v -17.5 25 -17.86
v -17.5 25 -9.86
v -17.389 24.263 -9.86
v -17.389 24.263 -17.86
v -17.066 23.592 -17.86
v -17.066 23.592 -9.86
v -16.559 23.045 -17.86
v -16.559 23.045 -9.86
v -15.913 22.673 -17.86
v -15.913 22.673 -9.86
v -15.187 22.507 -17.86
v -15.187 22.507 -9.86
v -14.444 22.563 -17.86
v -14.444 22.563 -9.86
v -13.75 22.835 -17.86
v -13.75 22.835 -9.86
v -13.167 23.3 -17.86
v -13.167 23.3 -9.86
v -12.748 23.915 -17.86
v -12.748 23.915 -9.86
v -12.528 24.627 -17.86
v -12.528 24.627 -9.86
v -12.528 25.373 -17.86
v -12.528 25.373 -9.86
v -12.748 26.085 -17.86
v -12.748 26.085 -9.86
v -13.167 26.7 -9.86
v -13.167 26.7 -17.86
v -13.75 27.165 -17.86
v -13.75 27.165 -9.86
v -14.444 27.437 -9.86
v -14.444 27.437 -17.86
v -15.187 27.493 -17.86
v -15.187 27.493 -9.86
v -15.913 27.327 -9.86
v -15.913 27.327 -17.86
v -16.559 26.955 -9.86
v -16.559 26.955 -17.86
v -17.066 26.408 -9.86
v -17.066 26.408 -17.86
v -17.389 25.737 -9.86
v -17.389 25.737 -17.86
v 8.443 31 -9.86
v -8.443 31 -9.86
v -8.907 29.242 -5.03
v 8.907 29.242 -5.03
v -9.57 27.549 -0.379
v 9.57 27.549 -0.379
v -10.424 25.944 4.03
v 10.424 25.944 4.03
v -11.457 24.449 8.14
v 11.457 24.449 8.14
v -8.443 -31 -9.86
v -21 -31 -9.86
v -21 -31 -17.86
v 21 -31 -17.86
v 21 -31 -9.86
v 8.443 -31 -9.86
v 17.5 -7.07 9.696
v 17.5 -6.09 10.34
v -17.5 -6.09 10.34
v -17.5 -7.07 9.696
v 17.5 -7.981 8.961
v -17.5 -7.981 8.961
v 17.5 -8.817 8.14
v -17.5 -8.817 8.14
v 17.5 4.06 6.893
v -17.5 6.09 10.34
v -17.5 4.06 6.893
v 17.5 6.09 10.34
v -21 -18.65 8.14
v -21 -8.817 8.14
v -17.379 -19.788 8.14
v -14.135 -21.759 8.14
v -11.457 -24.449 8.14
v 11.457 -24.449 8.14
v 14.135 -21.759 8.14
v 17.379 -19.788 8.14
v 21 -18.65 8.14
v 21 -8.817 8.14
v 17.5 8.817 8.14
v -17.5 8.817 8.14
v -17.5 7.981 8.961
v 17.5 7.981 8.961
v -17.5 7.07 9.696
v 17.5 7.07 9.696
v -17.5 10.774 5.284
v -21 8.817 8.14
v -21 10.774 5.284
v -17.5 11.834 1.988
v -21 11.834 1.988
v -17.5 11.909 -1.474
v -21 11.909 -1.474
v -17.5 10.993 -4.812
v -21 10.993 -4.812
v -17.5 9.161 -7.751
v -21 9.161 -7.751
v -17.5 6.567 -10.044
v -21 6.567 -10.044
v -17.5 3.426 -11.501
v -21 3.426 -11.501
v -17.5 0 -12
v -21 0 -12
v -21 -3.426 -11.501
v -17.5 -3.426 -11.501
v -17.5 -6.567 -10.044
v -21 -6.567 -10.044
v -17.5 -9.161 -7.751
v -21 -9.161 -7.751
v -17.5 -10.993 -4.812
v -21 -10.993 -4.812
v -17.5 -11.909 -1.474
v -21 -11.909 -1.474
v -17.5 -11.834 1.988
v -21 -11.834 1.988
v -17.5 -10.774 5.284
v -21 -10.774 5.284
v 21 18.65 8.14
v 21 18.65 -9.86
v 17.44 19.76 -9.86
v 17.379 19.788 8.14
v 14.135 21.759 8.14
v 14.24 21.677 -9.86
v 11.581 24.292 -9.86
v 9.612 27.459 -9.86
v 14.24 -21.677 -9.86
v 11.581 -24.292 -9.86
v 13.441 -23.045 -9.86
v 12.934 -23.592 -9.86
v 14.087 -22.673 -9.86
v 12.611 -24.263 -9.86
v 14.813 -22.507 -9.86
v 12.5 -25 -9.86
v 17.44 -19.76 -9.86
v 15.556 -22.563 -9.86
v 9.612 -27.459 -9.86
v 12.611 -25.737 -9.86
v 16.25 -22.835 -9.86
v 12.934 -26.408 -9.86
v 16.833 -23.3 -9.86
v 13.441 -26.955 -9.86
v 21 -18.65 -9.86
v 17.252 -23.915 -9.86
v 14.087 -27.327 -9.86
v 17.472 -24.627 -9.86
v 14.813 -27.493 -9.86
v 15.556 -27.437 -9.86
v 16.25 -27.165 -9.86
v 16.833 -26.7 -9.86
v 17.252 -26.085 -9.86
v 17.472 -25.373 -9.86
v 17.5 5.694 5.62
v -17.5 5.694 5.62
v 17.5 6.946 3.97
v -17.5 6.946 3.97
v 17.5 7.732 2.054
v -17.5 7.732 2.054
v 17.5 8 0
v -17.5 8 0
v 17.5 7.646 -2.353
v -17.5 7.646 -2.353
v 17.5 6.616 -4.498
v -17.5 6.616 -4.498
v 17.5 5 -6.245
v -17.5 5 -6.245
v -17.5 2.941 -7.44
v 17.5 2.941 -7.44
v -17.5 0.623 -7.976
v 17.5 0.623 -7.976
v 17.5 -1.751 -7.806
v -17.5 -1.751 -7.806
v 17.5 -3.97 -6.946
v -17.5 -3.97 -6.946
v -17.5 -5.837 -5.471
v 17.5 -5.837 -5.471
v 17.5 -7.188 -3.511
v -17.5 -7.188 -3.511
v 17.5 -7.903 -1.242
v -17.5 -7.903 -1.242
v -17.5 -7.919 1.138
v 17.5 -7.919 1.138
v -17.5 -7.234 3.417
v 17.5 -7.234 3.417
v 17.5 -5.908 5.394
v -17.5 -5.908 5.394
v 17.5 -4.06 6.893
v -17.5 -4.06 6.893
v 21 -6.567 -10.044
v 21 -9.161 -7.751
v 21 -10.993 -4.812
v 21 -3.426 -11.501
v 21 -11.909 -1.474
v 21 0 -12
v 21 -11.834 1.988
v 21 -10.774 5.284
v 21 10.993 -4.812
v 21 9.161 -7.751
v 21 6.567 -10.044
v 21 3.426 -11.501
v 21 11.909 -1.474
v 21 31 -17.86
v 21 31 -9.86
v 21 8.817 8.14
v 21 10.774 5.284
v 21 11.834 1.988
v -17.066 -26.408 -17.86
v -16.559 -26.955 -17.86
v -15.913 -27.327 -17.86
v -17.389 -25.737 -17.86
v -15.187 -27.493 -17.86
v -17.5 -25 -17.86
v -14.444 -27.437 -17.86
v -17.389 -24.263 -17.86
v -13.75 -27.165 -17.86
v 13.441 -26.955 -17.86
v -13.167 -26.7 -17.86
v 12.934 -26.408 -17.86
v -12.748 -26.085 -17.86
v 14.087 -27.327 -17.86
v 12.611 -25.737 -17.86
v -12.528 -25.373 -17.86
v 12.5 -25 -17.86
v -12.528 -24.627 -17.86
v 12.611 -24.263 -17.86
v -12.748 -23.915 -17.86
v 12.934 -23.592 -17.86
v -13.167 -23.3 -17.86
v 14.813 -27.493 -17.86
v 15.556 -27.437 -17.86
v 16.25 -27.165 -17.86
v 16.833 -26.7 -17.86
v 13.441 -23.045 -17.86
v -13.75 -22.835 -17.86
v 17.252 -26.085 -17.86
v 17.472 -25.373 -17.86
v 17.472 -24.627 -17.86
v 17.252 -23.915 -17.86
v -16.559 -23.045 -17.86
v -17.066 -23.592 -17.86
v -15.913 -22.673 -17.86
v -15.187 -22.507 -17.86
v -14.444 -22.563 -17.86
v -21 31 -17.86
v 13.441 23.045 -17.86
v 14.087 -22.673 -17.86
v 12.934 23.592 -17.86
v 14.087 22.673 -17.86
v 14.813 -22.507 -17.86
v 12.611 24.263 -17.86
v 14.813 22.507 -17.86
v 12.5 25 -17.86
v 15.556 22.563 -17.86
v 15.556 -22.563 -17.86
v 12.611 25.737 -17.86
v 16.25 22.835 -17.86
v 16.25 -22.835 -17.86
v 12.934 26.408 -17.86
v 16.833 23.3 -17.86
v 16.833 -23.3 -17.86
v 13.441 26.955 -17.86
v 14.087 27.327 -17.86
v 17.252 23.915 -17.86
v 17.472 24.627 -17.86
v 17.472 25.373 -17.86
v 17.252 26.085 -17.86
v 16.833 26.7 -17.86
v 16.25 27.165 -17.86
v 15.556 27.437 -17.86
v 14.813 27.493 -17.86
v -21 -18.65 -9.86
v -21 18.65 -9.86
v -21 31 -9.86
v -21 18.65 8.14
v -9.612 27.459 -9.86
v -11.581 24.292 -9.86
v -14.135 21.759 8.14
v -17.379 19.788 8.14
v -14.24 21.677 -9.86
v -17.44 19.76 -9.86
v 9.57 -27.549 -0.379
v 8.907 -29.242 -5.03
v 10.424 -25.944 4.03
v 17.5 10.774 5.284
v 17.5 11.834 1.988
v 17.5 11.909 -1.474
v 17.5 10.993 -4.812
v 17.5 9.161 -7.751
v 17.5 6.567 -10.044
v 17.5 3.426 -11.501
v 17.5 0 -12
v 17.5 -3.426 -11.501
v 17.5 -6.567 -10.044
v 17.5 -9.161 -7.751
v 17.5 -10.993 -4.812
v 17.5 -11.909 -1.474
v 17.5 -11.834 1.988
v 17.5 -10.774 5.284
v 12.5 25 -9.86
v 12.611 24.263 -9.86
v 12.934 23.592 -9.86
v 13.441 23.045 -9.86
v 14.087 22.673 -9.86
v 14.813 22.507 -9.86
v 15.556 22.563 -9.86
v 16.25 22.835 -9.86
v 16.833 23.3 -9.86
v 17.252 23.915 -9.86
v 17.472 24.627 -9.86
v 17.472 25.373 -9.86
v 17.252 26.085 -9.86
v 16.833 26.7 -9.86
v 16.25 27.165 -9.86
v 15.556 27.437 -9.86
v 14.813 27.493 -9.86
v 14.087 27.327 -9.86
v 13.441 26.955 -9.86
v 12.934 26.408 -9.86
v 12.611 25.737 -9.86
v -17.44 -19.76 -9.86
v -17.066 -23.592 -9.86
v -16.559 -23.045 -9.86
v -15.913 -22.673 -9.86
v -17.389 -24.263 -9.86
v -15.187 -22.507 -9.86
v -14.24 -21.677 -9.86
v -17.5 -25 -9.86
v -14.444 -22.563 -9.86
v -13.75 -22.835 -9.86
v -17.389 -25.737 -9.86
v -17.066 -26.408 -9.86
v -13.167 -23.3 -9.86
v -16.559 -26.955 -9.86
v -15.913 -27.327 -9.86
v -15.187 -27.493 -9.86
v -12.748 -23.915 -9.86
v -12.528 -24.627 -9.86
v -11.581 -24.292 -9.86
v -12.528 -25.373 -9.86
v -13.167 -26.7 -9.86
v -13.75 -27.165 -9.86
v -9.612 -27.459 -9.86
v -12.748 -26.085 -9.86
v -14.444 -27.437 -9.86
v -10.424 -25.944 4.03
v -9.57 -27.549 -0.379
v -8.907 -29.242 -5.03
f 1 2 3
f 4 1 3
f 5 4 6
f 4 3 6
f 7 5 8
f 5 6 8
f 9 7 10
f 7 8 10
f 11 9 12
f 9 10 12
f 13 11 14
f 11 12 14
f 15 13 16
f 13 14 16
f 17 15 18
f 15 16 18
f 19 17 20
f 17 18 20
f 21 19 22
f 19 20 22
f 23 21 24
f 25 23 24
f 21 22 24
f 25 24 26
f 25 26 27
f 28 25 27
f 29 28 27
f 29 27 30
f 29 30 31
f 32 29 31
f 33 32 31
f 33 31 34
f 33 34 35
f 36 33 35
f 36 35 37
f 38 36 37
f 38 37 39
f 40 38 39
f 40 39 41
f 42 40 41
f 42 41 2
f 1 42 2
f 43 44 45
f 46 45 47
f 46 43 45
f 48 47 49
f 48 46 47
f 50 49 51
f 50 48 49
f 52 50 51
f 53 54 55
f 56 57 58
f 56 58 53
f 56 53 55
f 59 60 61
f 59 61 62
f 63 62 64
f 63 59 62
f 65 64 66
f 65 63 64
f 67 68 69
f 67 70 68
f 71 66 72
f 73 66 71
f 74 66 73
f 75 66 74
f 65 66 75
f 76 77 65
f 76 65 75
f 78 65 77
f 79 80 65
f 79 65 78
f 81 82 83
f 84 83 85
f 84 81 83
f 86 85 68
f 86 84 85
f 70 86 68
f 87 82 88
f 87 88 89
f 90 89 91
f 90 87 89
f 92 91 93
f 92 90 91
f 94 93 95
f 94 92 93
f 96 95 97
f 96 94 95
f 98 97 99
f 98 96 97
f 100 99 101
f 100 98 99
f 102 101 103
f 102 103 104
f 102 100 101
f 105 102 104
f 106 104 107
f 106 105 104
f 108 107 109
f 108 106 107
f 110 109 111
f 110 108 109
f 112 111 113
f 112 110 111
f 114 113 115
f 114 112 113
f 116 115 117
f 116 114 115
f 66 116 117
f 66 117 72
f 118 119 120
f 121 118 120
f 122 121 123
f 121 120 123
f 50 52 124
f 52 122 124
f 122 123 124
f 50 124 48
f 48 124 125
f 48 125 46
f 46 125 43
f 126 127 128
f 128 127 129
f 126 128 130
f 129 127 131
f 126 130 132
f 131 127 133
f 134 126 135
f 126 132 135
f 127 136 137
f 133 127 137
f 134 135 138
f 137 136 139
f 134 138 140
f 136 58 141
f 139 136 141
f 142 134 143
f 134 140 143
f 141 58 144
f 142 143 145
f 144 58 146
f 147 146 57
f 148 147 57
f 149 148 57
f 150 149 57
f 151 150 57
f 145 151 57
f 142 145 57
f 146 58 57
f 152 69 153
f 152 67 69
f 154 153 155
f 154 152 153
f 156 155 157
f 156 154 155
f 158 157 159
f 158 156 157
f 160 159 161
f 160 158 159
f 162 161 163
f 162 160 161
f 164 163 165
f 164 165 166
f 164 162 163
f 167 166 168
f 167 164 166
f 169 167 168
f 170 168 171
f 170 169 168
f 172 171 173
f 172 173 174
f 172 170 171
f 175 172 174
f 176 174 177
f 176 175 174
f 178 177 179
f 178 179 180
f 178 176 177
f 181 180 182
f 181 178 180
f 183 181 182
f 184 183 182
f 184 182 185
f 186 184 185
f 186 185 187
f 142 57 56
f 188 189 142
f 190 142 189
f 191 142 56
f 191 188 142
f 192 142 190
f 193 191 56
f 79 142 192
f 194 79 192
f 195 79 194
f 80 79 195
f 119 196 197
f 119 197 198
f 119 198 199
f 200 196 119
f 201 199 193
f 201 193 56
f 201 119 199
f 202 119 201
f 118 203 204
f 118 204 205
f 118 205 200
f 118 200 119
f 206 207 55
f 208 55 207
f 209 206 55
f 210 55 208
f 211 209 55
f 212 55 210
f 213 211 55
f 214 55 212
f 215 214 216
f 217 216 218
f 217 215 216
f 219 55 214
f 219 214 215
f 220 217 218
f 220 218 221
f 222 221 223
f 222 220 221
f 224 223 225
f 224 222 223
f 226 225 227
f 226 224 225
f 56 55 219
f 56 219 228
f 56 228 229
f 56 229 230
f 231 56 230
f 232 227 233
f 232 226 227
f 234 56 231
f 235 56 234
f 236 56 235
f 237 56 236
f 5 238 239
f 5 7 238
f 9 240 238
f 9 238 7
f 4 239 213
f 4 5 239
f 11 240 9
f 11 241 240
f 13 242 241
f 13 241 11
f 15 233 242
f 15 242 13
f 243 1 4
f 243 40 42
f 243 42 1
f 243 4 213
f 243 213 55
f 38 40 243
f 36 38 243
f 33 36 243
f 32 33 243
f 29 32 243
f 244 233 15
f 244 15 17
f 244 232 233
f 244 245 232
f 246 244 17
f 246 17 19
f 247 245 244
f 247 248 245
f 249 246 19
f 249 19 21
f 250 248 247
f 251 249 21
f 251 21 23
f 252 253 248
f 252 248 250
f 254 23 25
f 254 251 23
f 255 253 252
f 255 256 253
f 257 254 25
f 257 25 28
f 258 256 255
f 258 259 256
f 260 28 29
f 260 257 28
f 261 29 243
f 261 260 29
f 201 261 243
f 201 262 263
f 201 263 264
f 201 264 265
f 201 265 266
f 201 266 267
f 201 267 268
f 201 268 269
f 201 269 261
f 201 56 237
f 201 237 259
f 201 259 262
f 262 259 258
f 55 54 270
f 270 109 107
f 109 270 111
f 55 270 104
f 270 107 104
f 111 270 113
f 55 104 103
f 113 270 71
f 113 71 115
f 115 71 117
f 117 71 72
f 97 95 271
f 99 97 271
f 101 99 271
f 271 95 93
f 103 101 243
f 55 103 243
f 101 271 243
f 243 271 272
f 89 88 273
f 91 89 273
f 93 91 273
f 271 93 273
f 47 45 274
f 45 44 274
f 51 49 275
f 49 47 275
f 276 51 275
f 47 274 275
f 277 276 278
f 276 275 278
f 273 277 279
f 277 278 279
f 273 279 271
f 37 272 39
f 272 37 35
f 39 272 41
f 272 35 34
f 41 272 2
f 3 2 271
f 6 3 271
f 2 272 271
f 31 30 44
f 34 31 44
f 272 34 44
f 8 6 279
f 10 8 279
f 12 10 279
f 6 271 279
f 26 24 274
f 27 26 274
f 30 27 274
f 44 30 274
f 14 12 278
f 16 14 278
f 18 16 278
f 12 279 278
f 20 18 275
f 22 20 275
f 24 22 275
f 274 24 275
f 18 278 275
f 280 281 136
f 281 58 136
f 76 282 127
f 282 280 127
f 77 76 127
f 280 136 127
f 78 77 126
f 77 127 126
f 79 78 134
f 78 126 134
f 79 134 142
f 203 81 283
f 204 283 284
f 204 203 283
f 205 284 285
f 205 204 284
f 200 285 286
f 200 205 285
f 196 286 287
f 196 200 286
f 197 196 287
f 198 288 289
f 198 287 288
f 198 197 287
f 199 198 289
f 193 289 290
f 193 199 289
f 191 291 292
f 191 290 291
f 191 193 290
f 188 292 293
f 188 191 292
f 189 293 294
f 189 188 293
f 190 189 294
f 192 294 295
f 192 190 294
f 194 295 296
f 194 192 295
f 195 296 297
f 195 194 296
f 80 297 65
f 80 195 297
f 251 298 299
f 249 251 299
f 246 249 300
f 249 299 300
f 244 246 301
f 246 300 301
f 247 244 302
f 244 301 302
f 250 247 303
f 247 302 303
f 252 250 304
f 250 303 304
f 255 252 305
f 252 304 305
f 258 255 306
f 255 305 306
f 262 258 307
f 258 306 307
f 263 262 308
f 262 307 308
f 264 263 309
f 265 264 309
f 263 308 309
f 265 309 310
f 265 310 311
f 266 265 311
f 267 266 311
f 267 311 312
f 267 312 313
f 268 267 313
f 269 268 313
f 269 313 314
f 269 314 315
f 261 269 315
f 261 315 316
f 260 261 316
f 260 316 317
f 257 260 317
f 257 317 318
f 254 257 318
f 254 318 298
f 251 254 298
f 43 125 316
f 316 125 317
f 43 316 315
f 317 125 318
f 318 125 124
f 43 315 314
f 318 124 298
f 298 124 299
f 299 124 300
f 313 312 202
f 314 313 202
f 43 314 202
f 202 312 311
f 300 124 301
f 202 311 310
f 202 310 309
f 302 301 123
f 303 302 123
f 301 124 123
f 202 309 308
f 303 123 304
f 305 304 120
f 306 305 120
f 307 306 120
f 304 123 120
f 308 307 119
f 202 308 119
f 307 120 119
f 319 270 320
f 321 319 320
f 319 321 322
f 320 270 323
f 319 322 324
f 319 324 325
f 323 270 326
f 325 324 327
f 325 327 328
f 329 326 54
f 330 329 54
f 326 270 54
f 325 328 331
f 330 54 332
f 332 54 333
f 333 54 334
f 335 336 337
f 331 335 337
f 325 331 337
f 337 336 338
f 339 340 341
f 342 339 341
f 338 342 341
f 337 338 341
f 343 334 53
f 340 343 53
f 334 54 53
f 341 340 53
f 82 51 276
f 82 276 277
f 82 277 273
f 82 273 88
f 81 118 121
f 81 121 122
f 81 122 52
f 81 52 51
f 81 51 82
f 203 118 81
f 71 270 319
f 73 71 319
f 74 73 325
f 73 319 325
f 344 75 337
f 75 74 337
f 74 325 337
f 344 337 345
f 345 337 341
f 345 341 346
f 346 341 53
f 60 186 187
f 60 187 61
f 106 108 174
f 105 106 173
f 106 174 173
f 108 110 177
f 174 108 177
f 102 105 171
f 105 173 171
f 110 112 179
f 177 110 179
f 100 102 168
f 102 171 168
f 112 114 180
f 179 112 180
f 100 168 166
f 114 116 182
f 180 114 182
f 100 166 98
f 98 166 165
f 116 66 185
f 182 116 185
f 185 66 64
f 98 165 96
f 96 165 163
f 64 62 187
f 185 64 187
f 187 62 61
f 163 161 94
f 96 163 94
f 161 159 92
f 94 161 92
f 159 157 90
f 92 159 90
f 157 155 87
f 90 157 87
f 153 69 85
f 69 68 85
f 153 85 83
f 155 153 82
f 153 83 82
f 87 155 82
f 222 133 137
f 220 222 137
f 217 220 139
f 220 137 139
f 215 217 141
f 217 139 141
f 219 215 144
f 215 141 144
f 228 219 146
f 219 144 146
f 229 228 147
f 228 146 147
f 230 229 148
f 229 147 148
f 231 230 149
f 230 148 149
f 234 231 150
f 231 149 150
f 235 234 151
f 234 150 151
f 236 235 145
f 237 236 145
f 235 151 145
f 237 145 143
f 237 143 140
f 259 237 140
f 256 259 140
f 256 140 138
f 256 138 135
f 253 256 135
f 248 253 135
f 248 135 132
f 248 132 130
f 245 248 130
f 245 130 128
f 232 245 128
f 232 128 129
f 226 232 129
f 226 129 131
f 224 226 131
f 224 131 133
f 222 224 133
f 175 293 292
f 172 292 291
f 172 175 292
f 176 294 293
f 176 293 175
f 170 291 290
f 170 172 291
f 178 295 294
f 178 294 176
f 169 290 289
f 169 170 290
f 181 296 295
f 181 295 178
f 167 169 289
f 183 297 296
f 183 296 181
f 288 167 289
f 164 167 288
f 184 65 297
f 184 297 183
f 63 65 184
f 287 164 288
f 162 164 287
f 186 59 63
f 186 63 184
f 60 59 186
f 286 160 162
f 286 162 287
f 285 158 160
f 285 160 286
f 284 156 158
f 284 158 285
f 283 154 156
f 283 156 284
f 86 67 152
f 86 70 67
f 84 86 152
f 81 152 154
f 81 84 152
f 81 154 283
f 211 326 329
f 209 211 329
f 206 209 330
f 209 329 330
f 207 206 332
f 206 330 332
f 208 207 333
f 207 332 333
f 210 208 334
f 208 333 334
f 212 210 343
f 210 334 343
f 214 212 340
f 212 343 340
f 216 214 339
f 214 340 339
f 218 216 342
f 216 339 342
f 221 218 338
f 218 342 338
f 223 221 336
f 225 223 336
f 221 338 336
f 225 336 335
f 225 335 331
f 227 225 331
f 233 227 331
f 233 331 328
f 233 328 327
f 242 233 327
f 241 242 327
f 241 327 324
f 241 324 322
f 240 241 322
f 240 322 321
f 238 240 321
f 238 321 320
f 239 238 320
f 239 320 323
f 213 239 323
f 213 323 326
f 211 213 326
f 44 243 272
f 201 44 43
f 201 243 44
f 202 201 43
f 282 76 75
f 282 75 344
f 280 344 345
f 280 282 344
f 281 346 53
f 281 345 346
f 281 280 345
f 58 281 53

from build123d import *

# Parameters (mm, degrees)
F1_DEPTH = 21
F3_R     = 15.743514377
F4_DEPTH = 33
F5_DEPTH = 17.5
F7_D     = 5


with BuildPart() as f1:
    # F0 (on Right) → F1 (new body, symmetric)
    with BuildSketch(Plane.YZ):
        with BuildLine():
            Line((24.4485357832, 8.14), (8.8170516614, 8.14))
            ThreePointArc((8.8170516614, 8.14), (0, -12), (-8.8170516614, 8.14))
            Line((-8.8170516614, 8.14), (-24.4485357832, 8.14))
            Line((-24.4485357832, 8.14), (-31, -9.86))
            Line((-31, -9.86), (-31, -17.86))
            Line((-31, -17.86), (0, -17.86))
            Line((0, -17.86), (31, -17.86))
            Line((31, -17.86), (31, -9.86))
            Line((31, -9.86), (24.4485357832, 8.14))
        make_face()
    extrude(amount=F1_DEPTH, both=True)

    # F3 (on offset) → F4 (cut)
    with BuildSketch(Plane(origin=(0, 0, -9.86), x_dir=(1, 0, 0), z_dir=(0, 0, -1))):
        with Locations((-23.8725915551, 34.129627049)):
            Circle(F3_R)
        with Locations((-23.8725915551, -34.129627049)):
            Circle(F3_R)
        with Locations((23.8725915551, -34.129627049)):
            Circle(F3_R)
        with Locations((23.8725915551, 34.129627049)):
            Circle(F3_R)
    extrude(amount=-F4_DEPTH, mode=Mode.SUBTRACT)

    # F0 (on Right) → F5 (join, symmetric)
    with BuildSketch(Plane.YZ):
        with BuildLine():
            ThreePointArc((4.0603069037, 6.8930332835), (6.9455905159, 3.9697320294), (8, 0))
            ThreePointArc((8, 0), (-3.9697320294, -6.9455905159), (-4.0603069037, 6.8930332835))
            Line((-4.0603069037, 6.8930332835), (-6.0904603555, 10.3395499253))
            ThreePointArc((-6.0904603555, 10.3395499253), (-7.5344531057, 9.3398081564), (-8.8170516614, 8.14))
            ThreePointArc((-8.8170516614, 8.14), (0, -12), (8.8170516614, 8.14))
            ThreePointArc((8.8170516614, 8.14), (7.5344531057, 9.3398081564), (6.0904603555, 10.3395499253))
            Line((6.0904603555, 10.3395499253), (4.0603069037, 6.8930332835))
        make_face()
    extrude(amount=F5_DEPTH, both=True)

    # F7 (through all)
    with Locations(Plane(origin=(0, 0, -17.86), x_dir=(1, 0, 0), z_dir=(0, 0, -1))):
        with Locations((-15, -25), (-15, 25), (15, 25), (15, -25)):
            Hole(F7_D / 2)


solid = f1.part
